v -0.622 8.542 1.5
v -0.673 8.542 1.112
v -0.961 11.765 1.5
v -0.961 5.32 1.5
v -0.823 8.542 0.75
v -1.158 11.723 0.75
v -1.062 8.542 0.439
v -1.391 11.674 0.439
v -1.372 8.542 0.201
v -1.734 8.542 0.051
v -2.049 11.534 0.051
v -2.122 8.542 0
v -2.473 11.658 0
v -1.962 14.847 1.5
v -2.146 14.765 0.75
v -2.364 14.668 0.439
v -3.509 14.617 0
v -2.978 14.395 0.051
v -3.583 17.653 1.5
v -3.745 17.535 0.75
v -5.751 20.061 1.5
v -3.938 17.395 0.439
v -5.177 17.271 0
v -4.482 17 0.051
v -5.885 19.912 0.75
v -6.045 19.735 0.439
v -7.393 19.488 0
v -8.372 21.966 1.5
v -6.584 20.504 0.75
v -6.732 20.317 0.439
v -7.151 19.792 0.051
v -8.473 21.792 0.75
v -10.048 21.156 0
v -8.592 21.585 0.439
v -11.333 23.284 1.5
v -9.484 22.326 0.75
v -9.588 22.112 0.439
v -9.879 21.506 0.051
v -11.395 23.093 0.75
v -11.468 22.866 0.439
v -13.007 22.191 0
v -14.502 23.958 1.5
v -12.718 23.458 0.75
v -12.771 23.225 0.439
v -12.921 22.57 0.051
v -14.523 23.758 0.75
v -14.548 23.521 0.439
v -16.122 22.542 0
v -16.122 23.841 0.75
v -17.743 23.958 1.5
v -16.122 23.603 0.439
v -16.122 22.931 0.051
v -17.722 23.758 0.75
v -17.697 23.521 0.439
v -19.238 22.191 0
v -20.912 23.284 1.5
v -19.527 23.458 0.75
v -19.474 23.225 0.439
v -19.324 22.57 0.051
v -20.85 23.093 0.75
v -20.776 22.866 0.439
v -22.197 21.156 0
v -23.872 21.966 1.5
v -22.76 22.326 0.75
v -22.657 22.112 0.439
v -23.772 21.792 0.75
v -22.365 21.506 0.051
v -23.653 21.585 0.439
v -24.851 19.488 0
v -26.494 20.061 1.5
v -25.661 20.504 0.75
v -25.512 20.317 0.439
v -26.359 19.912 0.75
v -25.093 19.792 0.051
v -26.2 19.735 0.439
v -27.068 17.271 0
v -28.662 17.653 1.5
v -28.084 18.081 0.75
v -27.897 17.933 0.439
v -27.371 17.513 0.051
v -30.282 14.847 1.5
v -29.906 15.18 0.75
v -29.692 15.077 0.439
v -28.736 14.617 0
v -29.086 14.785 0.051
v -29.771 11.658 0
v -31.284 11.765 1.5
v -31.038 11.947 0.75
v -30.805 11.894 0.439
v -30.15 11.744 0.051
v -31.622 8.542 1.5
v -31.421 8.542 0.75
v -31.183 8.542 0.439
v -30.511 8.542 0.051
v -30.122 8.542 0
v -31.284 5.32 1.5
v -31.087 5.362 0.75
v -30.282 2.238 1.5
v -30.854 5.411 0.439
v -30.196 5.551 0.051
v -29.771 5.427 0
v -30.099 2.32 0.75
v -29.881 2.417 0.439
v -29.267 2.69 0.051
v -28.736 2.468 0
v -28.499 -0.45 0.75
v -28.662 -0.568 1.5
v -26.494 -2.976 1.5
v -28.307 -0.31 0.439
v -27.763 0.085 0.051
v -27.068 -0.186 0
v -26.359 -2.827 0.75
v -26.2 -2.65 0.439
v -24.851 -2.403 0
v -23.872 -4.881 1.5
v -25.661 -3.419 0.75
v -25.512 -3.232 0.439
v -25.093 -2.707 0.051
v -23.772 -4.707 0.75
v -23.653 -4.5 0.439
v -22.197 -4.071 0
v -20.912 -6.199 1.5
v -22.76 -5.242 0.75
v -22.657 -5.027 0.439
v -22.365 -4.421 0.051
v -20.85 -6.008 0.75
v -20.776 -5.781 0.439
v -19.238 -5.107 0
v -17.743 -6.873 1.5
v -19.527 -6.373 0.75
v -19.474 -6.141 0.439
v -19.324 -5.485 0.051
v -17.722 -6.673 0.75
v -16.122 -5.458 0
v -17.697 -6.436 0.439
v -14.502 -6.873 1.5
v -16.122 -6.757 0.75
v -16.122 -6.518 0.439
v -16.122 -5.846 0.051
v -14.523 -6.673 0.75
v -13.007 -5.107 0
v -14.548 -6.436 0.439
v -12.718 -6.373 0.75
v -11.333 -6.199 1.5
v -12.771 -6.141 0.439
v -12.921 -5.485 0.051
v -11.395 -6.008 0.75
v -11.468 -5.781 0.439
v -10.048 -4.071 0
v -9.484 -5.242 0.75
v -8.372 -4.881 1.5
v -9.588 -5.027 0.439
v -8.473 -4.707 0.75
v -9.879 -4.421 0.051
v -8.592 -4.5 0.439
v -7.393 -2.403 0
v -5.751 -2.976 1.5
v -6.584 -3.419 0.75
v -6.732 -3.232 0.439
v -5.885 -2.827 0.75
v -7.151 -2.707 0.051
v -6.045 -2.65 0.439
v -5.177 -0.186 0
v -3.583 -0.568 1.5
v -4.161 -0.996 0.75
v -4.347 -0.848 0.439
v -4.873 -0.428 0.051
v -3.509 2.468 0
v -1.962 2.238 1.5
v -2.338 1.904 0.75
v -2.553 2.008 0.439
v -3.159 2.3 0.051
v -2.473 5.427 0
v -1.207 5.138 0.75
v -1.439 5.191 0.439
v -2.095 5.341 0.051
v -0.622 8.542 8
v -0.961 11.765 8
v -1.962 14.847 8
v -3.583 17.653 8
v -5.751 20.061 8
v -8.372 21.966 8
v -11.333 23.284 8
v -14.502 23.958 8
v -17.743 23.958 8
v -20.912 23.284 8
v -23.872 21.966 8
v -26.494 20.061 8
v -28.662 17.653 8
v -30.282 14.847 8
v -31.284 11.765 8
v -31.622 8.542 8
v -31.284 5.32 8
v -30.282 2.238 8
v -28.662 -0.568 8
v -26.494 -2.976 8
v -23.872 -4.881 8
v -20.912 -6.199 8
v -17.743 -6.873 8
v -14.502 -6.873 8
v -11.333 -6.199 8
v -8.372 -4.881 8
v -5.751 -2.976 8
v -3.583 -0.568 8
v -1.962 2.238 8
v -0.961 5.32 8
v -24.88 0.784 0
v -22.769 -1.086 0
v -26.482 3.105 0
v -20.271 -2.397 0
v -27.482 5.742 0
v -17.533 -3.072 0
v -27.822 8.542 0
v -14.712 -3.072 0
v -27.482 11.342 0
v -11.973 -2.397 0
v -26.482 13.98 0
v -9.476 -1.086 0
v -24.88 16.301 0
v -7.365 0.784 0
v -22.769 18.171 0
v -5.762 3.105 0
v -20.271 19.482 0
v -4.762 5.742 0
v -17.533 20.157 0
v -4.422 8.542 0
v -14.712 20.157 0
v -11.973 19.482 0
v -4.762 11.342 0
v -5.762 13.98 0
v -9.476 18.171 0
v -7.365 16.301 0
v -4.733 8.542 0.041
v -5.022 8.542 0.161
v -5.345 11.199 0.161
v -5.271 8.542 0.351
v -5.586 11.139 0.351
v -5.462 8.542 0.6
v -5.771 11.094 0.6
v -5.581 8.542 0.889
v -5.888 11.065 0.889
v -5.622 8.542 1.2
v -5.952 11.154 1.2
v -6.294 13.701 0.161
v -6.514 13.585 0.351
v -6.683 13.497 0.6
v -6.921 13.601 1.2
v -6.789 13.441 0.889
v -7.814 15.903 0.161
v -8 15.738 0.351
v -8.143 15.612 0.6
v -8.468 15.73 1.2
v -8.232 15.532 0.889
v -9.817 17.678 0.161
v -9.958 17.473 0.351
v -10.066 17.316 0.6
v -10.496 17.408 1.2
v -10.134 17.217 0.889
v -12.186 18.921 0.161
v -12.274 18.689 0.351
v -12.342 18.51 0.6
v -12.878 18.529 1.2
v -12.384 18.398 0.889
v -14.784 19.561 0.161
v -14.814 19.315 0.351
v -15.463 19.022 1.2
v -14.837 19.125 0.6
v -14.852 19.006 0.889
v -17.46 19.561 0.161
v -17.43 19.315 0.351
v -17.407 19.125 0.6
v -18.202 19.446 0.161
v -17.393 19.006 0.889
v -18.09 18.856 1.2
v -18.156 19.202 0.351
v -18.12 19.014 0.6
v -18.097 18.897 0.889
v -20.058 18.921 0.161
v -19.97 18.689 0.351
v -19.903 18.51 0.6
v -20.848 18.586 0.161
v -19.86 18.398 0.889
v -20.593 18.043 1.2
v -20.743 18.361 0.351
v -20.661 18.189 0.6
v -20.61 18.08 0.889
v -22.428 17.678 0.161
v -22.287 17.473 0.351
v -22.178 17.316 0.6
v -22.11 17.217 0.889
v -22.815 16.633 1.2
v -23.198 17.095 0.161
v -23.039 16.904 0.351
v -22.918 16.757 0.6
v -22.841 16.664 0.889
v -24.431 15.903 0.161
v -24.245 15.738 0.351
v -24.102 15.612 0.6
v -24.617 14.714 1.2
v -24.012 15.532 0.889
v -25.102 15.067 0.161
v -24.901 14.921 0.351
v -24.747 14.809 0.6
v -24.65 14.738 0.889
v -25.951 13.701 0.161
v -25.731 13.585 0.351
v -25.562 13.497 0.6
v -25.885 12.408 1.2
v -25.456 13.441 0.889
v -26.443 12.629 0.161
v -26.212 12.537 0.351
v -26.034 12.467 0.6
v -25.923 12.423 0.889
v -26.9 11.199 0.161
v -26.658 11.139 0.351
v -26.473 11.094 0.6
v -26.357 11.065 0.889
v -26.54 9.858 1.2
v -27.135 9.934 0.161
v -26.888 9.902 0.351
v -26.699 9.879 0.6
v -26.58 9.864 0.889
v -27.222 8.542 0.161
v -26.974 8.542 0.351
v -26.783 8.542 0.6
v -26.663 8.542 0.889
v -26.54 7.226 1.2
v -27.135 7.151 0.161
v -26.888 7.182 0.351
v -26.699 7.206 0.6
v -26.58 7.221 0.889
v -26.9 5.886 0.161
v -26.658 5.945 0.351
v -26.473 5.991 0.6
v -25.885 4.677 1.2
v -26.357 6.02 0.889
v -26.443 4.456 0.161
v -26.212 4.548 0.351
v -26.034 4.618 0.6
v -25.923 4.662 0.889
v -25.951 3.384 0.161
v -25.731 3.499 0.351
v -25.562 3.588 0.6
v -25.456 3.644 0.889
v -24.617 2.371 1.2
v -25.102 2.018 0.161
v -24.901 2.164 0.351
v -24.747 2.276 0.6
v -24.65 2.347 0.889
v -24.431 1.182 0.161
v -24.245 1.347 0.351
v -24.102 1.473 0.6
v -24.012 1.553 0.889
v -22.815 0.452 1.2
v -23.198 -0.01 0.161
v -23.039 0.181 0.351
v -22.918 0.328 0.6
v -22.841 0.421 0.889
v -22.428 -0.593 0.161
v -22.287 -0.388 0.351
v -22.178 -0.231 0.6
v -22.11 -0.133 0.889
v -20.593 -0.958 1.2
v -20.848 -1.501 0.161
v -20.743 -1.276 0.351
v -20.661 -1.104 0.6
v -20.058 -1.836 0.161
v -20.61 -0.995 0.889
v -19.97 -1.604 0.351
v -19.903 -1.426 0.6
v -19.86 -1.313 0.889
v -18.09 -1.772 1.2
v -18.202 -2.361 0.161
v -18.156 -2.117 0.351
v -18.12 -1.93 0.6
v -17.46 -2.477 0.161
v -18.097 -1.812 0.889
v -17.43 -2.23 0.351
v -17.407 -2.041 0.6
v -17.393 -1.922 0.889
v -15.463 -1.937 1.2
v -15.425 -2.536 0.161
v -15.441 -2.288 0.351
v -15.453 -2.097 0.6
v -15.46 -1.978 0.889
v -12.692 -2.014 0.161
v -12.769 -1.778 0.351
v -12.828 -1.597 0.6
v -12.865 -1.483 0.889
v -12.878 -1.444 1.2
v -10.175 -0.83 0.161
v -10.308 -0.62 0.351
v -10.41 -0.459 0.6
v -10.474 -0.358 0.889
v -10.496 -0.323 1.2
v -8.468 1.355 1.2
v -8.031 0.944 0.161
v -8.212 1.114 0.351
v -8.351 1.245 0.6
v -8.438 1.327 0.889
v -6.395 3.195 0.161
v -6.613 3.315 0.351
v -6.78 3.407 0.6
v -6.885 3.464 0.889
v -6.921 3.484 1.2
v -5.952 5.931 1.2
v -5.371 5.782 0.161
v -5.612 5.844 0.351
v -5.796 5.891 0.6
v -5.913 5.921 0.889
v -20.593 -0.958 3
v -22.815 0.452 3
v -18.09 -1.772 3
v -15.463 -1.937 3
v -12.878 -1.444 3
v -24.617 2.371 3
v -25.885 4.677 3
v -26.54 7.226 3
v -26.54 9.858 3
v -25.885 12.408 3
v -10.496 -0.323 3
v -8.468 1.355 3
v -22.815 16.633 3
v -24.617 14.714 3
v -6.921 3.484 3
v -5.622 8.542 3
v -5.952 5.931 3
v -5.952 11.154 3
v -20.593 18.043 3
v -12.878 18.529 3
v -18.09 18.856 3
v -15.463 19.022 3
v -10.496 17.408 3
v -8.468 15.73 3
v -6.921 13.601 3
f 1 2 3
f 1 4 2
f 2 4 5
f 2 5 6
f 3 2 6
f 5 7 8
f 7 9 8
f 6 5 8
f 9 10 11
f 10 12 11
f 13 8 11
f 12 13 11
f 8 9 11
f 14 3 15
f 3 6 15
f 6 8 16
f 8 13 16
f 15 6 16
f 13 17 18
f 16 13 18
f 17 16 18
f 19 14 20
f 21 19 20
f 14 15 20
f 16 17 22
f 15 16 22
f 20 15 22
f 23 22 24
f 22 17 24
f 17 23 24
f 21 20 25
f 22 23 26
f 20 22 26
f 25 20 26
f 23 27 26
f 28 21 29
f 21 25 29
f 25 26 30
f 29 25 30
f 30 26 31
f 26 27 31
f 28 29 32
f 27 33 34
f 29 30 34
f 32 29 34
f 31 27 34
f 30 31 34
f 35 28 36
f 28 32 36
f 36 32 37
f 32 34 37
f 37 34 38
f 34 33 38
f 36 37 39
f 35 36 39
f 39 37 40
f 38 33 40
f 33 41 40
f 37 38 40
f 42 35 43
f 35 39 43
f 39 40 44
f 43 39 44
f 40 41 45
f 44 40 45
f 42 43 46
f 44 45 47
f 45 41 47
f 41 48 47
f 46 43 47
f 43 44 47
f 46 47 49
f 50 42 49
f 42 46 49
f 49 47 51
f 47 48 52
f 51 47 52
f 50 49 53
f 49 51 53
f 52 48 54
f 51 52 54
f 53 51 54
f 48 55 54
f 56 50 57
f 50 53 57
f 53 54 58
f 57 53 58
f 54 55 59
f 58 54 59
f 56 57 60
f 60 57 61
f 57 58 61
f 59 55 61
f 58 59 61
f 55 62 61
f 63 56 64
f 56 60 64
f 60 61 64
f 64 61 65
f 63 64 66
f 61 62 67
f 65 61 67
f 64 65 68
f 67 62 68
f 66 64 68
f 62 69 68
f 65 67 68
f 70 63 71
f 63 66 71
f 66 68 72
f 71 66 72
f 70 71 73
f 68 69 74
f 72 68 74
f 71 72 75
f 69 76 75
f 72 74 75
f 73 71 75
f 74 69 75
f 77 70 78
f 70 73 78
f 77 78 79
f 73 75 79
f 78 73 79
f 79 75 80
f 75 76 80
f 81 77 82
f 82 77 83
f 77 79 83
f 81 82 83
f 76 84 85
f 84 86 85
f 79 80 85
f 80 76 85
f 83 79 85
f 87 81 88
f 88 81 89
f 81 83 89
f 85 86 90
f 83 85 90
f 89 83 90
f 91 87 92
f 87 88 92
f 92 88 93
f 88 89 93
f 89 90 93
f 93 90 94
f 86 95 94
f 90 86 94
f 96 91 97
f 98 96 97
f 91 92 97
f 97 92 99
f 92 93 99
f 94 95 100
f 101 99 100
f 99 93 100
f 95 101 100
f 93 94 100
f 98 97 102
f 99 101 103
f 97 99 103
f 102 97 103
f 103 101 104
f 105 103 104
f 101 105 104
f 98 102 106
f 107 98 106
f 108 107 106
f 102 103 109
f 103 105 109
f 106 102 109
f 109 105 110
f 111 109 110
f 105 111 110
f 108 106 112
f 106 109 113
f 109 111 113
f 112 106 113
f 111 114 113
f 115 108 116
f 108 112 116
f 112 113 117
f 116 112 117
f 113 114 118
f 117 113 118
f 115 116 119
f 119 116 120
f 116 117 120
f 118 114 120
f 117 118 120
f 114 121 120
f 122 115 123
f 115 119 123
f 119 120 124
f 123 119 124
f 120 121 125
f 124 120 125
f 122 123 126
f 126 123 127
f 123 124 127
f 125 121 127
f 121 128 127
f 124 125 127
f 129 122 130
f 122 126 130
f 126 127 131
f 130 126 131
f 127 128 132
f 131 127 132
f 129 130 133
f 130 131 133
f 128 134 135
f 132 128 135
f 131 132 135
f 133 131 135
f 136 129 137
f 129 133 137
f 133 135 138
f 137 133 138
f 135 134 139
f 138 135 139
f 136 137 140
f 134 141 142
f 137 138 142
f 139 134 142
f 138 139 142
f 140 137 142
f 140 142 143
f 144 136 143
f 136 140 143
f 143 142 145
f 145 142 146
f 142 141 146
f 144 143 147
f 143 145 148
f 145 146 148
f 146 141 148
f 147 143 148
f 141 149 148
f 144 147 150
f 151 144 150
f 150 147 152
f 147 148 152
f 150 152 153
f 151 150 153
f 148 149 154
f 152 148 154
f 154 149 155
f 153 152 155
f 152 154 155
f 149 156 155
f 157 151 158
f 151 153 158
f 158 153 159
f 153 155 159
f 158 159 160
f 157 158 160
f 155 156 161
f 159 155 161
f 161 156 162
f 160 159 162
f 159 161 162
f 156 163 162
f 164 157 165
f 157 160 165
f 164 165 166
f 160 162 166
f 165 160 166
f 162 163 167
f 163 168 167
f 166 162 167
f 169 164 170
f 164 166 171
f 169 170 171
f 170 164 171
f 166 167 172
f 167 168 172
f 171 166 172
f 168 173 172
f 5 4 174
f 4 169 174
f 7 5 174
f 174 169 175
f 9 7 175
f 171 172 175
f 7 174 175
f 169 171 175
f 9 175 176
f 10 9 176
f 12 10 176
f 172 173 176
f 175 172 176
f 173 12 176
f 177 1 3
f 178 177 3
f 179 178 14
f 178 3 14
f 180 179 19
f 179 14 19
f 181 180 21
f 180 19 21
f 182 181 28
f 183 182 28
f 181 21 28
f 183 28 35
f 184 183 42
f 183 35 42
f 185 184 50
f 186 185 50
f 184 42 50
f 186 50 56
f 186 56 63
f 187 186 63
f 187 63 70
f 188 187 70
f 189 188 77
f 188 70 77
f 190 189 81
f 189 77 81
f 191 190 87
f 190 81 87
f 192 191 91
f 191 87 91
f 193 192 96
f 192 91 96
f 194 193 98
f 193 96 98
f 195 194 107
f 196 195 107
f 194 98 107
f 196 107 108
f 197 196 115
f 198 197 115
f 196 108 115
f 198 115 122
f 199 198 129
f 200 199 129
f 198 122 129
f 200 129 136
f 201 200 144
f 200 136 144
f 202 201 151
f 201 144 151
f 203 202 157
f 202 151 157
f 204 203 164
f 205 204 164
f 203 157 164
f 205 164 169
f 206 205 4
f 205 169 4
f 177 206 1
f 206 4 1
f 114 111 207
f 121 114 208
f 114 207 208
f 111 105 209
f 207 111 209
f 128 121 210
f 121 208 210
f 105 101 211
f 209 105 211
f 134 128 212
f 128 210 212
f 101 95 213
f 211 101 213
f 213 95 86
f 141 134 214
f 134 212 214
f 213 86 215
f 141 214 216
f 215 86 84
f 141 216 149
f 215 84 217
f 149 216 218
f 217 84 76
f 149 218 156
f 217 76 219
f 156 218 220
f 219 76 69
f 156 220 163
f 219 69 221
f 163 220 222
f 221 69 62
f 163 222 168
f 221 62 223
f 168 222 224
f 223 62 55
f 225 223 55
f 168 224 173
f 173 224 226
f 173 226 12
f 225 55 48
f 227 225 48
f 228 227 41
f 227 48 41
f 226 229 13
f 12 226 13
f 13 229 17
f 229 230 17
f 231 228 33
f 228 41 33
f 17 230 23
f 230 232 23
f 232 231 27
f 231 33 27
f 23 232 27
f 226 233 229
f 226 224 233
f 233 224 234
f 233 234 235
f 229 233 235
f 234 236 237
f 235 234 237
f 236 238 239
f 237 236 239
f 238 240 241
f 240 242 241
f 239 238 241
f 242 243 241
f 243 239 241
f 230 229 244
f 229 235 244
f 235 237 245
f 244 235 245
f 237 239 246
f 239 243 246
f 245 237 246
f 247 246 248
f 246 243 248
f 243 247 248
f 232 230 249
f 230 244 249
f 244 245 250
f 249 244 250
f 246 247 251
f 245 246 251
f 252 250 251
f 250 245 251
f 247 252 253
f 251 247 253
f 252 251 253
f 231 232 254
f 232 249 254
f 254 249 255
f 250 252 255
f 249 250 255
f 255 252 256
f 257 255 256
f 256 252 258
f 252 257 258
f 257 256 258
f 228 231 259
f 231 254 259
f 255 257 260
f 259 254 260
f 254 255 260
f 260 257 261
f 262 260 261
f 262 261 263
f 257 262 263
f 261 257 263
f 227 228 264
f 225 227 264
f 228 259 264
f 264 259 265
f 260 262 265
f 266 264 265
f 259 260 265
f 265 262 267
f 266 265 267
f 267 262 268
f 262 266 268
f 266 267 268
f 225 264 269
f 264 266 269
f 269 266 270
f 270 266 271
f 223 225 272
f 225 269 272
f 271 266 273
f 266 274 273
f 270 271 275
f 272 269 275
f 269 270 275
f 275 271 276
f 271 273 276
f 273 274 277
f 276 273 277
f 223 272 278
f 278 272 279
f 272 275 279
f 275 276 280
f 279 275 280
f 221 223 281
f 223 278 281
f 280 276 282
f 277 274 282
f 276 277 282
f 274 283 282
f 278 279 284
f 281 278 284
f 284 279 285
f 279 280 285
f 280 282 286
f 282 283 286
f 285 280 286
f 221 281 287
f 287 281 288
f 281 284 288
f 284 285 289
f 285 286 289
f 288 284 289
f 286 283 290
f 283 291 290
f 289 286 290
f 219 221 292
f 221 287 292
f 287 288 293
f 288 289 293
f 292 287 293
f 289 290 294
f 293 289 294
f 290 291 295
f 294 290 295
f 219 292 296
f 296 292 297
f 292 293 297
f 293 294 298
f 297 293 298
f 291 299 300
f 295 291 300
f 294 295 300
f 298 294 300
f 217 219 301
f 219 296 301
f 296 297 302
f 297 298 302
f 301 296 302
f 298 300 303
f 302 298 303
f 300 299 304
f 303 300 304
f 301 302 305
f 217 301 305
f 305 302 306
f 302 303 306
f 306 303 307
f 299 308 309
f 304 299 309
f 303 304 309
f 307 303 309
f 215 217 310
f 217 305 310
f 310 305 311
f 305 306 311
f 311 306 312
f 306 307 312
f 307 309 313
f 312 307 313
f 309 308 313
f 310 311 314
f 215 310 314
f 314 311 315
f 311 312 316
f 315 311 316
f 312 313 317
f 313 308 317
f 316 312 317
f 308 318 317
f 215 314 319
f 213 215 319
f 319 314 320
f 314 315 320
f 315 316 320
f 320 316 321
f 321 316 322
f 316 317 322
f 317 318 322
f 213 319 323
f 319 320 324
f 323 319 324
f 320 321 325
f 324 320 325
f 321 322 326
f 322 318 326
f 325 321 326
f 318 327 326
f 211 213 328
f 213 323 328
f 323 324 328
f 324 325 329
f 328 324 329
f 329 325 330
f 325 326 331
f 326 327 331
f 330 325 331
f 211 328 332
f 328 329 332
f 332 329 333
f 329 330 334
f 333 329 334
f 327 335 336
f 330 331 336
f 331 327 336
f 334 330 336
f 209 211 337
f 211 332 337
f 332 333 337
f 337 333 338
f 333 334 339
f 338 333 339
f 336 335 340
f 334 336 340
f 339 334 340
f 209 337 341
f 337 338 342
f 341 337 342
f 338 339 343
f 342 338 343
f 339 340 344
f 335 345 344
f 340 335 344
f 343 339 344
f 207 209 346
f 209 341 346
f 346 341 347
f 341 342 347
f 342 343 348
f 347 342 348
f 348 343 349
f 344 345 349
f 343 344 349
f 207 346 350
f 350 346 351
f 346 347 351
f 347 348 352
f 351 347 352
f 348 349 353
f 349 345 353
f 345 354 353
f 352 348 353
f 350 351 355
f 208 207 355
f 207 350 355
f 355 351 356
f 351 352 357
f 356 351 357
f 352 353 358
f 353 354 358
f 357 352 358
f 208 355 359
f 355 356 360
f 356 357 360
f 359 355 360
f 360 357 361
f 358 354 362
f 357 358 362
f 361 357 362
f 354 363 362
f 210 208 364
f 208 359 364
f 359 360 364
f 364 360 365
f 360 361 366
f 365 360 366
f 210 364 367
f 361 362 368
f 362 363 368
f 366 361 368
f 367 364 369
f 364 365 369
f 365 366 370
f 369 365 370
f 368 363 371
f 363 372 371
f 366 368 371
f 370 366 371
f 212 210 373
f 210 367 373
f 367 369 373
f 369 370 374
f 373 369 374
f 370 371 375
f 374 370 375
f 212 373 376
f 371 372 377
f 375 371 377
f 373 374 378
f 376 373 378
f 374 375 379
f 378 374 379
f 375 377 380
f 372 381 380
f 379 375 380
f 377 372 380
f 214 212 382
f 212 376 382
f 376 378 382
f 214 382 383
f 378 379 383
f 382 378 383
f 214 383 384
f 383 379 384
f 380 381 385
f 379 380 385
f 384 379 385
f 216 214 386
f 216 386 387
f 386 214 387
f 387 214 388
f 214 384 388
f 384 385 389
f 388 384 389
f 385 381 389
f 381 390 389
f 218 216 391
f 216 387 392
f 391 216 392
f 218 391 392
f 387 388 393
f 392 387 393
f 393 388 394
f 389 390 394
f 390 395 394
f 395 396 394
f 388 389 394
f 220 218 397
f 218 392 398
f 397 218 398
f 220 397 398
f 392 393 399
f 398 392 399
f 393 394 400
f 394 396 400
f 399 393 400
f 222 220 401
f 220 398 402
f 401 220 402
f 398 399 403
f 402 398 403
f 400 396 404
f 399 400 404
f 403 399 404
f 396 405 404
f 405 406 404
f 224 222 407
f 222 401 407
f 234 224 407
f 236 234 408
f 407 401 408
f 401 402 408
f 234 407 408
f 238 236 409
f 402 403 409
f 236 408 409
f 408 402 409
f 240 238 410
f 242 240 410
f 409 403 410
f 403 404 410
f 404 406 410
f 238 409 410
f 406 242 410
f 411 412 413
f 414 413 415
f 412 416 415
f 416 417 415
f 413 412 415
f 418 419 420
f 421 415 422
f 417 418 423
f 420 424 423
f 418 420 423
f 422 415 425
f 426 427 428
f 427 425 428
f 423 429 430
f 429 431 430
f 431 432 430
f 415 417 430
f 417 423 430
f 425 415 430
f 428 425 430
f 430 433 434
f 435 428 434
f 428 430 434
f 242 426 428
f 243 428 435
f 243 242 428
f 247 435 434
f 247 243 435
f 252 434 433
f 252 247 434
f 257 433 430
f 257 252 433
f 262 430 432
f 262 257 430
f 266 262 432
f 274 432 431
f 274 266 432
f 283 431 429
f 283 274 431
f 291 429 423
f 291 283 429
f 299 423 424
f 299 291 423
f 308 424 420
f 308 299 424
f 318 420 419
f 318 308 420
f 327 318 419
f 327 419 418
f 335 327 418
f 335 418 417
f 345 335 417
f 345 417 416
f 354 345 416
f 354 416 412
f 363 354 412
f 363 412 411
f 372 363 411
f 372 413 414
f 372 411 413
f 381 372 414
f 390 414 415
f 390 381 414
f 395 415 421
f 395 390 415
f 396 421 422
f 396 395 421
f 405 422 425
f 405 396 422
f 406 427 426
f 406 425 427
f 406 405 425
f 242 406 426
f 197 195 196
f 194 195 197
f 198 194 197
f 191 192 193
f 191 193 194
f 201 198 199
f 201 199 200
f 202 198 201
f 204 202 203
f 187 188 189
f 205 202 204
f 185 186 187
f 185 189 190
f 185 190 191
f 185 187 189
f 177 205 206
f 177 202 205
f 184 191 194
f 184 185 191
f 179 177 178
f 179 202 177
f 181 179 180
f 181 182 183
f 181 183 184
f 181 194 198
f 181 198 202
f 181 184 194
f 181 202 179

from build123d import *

# Parameters (mm, degrees)
F0_R     = 15.5
F1_DEPTH = 8
F2_T     = -5
F3_R     = 1.5
F4_R     = 1.2


with BuildPart() as f1:
    # F0 (on Top) → F1 (new body)
    with BuildSketch(Plane.XY):
        with Locations((-16.122315079, 8.5424212739)):
            Circle(F0_R)
    extrude(amount=F1_DEPTH)

    # F2
    f2_openings = [f1.faces().sort_by_distance(p)[0] for p in [
        (-16.122315, 8.542421, 0),
    ]]
    offset(amount=F2_T, openings=f2_openings)

    # F3
    f3_edges = [f1.edges().sort_by_distance(p)[0] for p in [
        (-31.622315, 8.542421, 0),
    ]]
    fillet(f3_edges, radius=F3_R)

    # F4
    f4_edges = [f1.edges().sort_by_distance(p)[0] for p in [
        (-26.622315, 8.542421, 0),
        (-1.061655, 8.542421, 0.43934),
        (-31.622315, 8.542421, 1.5),
        (-30.122315, 8.542421, 0),
    ]]
    fillet(f4_edges, radius=F4_R)


solid = f1.part
